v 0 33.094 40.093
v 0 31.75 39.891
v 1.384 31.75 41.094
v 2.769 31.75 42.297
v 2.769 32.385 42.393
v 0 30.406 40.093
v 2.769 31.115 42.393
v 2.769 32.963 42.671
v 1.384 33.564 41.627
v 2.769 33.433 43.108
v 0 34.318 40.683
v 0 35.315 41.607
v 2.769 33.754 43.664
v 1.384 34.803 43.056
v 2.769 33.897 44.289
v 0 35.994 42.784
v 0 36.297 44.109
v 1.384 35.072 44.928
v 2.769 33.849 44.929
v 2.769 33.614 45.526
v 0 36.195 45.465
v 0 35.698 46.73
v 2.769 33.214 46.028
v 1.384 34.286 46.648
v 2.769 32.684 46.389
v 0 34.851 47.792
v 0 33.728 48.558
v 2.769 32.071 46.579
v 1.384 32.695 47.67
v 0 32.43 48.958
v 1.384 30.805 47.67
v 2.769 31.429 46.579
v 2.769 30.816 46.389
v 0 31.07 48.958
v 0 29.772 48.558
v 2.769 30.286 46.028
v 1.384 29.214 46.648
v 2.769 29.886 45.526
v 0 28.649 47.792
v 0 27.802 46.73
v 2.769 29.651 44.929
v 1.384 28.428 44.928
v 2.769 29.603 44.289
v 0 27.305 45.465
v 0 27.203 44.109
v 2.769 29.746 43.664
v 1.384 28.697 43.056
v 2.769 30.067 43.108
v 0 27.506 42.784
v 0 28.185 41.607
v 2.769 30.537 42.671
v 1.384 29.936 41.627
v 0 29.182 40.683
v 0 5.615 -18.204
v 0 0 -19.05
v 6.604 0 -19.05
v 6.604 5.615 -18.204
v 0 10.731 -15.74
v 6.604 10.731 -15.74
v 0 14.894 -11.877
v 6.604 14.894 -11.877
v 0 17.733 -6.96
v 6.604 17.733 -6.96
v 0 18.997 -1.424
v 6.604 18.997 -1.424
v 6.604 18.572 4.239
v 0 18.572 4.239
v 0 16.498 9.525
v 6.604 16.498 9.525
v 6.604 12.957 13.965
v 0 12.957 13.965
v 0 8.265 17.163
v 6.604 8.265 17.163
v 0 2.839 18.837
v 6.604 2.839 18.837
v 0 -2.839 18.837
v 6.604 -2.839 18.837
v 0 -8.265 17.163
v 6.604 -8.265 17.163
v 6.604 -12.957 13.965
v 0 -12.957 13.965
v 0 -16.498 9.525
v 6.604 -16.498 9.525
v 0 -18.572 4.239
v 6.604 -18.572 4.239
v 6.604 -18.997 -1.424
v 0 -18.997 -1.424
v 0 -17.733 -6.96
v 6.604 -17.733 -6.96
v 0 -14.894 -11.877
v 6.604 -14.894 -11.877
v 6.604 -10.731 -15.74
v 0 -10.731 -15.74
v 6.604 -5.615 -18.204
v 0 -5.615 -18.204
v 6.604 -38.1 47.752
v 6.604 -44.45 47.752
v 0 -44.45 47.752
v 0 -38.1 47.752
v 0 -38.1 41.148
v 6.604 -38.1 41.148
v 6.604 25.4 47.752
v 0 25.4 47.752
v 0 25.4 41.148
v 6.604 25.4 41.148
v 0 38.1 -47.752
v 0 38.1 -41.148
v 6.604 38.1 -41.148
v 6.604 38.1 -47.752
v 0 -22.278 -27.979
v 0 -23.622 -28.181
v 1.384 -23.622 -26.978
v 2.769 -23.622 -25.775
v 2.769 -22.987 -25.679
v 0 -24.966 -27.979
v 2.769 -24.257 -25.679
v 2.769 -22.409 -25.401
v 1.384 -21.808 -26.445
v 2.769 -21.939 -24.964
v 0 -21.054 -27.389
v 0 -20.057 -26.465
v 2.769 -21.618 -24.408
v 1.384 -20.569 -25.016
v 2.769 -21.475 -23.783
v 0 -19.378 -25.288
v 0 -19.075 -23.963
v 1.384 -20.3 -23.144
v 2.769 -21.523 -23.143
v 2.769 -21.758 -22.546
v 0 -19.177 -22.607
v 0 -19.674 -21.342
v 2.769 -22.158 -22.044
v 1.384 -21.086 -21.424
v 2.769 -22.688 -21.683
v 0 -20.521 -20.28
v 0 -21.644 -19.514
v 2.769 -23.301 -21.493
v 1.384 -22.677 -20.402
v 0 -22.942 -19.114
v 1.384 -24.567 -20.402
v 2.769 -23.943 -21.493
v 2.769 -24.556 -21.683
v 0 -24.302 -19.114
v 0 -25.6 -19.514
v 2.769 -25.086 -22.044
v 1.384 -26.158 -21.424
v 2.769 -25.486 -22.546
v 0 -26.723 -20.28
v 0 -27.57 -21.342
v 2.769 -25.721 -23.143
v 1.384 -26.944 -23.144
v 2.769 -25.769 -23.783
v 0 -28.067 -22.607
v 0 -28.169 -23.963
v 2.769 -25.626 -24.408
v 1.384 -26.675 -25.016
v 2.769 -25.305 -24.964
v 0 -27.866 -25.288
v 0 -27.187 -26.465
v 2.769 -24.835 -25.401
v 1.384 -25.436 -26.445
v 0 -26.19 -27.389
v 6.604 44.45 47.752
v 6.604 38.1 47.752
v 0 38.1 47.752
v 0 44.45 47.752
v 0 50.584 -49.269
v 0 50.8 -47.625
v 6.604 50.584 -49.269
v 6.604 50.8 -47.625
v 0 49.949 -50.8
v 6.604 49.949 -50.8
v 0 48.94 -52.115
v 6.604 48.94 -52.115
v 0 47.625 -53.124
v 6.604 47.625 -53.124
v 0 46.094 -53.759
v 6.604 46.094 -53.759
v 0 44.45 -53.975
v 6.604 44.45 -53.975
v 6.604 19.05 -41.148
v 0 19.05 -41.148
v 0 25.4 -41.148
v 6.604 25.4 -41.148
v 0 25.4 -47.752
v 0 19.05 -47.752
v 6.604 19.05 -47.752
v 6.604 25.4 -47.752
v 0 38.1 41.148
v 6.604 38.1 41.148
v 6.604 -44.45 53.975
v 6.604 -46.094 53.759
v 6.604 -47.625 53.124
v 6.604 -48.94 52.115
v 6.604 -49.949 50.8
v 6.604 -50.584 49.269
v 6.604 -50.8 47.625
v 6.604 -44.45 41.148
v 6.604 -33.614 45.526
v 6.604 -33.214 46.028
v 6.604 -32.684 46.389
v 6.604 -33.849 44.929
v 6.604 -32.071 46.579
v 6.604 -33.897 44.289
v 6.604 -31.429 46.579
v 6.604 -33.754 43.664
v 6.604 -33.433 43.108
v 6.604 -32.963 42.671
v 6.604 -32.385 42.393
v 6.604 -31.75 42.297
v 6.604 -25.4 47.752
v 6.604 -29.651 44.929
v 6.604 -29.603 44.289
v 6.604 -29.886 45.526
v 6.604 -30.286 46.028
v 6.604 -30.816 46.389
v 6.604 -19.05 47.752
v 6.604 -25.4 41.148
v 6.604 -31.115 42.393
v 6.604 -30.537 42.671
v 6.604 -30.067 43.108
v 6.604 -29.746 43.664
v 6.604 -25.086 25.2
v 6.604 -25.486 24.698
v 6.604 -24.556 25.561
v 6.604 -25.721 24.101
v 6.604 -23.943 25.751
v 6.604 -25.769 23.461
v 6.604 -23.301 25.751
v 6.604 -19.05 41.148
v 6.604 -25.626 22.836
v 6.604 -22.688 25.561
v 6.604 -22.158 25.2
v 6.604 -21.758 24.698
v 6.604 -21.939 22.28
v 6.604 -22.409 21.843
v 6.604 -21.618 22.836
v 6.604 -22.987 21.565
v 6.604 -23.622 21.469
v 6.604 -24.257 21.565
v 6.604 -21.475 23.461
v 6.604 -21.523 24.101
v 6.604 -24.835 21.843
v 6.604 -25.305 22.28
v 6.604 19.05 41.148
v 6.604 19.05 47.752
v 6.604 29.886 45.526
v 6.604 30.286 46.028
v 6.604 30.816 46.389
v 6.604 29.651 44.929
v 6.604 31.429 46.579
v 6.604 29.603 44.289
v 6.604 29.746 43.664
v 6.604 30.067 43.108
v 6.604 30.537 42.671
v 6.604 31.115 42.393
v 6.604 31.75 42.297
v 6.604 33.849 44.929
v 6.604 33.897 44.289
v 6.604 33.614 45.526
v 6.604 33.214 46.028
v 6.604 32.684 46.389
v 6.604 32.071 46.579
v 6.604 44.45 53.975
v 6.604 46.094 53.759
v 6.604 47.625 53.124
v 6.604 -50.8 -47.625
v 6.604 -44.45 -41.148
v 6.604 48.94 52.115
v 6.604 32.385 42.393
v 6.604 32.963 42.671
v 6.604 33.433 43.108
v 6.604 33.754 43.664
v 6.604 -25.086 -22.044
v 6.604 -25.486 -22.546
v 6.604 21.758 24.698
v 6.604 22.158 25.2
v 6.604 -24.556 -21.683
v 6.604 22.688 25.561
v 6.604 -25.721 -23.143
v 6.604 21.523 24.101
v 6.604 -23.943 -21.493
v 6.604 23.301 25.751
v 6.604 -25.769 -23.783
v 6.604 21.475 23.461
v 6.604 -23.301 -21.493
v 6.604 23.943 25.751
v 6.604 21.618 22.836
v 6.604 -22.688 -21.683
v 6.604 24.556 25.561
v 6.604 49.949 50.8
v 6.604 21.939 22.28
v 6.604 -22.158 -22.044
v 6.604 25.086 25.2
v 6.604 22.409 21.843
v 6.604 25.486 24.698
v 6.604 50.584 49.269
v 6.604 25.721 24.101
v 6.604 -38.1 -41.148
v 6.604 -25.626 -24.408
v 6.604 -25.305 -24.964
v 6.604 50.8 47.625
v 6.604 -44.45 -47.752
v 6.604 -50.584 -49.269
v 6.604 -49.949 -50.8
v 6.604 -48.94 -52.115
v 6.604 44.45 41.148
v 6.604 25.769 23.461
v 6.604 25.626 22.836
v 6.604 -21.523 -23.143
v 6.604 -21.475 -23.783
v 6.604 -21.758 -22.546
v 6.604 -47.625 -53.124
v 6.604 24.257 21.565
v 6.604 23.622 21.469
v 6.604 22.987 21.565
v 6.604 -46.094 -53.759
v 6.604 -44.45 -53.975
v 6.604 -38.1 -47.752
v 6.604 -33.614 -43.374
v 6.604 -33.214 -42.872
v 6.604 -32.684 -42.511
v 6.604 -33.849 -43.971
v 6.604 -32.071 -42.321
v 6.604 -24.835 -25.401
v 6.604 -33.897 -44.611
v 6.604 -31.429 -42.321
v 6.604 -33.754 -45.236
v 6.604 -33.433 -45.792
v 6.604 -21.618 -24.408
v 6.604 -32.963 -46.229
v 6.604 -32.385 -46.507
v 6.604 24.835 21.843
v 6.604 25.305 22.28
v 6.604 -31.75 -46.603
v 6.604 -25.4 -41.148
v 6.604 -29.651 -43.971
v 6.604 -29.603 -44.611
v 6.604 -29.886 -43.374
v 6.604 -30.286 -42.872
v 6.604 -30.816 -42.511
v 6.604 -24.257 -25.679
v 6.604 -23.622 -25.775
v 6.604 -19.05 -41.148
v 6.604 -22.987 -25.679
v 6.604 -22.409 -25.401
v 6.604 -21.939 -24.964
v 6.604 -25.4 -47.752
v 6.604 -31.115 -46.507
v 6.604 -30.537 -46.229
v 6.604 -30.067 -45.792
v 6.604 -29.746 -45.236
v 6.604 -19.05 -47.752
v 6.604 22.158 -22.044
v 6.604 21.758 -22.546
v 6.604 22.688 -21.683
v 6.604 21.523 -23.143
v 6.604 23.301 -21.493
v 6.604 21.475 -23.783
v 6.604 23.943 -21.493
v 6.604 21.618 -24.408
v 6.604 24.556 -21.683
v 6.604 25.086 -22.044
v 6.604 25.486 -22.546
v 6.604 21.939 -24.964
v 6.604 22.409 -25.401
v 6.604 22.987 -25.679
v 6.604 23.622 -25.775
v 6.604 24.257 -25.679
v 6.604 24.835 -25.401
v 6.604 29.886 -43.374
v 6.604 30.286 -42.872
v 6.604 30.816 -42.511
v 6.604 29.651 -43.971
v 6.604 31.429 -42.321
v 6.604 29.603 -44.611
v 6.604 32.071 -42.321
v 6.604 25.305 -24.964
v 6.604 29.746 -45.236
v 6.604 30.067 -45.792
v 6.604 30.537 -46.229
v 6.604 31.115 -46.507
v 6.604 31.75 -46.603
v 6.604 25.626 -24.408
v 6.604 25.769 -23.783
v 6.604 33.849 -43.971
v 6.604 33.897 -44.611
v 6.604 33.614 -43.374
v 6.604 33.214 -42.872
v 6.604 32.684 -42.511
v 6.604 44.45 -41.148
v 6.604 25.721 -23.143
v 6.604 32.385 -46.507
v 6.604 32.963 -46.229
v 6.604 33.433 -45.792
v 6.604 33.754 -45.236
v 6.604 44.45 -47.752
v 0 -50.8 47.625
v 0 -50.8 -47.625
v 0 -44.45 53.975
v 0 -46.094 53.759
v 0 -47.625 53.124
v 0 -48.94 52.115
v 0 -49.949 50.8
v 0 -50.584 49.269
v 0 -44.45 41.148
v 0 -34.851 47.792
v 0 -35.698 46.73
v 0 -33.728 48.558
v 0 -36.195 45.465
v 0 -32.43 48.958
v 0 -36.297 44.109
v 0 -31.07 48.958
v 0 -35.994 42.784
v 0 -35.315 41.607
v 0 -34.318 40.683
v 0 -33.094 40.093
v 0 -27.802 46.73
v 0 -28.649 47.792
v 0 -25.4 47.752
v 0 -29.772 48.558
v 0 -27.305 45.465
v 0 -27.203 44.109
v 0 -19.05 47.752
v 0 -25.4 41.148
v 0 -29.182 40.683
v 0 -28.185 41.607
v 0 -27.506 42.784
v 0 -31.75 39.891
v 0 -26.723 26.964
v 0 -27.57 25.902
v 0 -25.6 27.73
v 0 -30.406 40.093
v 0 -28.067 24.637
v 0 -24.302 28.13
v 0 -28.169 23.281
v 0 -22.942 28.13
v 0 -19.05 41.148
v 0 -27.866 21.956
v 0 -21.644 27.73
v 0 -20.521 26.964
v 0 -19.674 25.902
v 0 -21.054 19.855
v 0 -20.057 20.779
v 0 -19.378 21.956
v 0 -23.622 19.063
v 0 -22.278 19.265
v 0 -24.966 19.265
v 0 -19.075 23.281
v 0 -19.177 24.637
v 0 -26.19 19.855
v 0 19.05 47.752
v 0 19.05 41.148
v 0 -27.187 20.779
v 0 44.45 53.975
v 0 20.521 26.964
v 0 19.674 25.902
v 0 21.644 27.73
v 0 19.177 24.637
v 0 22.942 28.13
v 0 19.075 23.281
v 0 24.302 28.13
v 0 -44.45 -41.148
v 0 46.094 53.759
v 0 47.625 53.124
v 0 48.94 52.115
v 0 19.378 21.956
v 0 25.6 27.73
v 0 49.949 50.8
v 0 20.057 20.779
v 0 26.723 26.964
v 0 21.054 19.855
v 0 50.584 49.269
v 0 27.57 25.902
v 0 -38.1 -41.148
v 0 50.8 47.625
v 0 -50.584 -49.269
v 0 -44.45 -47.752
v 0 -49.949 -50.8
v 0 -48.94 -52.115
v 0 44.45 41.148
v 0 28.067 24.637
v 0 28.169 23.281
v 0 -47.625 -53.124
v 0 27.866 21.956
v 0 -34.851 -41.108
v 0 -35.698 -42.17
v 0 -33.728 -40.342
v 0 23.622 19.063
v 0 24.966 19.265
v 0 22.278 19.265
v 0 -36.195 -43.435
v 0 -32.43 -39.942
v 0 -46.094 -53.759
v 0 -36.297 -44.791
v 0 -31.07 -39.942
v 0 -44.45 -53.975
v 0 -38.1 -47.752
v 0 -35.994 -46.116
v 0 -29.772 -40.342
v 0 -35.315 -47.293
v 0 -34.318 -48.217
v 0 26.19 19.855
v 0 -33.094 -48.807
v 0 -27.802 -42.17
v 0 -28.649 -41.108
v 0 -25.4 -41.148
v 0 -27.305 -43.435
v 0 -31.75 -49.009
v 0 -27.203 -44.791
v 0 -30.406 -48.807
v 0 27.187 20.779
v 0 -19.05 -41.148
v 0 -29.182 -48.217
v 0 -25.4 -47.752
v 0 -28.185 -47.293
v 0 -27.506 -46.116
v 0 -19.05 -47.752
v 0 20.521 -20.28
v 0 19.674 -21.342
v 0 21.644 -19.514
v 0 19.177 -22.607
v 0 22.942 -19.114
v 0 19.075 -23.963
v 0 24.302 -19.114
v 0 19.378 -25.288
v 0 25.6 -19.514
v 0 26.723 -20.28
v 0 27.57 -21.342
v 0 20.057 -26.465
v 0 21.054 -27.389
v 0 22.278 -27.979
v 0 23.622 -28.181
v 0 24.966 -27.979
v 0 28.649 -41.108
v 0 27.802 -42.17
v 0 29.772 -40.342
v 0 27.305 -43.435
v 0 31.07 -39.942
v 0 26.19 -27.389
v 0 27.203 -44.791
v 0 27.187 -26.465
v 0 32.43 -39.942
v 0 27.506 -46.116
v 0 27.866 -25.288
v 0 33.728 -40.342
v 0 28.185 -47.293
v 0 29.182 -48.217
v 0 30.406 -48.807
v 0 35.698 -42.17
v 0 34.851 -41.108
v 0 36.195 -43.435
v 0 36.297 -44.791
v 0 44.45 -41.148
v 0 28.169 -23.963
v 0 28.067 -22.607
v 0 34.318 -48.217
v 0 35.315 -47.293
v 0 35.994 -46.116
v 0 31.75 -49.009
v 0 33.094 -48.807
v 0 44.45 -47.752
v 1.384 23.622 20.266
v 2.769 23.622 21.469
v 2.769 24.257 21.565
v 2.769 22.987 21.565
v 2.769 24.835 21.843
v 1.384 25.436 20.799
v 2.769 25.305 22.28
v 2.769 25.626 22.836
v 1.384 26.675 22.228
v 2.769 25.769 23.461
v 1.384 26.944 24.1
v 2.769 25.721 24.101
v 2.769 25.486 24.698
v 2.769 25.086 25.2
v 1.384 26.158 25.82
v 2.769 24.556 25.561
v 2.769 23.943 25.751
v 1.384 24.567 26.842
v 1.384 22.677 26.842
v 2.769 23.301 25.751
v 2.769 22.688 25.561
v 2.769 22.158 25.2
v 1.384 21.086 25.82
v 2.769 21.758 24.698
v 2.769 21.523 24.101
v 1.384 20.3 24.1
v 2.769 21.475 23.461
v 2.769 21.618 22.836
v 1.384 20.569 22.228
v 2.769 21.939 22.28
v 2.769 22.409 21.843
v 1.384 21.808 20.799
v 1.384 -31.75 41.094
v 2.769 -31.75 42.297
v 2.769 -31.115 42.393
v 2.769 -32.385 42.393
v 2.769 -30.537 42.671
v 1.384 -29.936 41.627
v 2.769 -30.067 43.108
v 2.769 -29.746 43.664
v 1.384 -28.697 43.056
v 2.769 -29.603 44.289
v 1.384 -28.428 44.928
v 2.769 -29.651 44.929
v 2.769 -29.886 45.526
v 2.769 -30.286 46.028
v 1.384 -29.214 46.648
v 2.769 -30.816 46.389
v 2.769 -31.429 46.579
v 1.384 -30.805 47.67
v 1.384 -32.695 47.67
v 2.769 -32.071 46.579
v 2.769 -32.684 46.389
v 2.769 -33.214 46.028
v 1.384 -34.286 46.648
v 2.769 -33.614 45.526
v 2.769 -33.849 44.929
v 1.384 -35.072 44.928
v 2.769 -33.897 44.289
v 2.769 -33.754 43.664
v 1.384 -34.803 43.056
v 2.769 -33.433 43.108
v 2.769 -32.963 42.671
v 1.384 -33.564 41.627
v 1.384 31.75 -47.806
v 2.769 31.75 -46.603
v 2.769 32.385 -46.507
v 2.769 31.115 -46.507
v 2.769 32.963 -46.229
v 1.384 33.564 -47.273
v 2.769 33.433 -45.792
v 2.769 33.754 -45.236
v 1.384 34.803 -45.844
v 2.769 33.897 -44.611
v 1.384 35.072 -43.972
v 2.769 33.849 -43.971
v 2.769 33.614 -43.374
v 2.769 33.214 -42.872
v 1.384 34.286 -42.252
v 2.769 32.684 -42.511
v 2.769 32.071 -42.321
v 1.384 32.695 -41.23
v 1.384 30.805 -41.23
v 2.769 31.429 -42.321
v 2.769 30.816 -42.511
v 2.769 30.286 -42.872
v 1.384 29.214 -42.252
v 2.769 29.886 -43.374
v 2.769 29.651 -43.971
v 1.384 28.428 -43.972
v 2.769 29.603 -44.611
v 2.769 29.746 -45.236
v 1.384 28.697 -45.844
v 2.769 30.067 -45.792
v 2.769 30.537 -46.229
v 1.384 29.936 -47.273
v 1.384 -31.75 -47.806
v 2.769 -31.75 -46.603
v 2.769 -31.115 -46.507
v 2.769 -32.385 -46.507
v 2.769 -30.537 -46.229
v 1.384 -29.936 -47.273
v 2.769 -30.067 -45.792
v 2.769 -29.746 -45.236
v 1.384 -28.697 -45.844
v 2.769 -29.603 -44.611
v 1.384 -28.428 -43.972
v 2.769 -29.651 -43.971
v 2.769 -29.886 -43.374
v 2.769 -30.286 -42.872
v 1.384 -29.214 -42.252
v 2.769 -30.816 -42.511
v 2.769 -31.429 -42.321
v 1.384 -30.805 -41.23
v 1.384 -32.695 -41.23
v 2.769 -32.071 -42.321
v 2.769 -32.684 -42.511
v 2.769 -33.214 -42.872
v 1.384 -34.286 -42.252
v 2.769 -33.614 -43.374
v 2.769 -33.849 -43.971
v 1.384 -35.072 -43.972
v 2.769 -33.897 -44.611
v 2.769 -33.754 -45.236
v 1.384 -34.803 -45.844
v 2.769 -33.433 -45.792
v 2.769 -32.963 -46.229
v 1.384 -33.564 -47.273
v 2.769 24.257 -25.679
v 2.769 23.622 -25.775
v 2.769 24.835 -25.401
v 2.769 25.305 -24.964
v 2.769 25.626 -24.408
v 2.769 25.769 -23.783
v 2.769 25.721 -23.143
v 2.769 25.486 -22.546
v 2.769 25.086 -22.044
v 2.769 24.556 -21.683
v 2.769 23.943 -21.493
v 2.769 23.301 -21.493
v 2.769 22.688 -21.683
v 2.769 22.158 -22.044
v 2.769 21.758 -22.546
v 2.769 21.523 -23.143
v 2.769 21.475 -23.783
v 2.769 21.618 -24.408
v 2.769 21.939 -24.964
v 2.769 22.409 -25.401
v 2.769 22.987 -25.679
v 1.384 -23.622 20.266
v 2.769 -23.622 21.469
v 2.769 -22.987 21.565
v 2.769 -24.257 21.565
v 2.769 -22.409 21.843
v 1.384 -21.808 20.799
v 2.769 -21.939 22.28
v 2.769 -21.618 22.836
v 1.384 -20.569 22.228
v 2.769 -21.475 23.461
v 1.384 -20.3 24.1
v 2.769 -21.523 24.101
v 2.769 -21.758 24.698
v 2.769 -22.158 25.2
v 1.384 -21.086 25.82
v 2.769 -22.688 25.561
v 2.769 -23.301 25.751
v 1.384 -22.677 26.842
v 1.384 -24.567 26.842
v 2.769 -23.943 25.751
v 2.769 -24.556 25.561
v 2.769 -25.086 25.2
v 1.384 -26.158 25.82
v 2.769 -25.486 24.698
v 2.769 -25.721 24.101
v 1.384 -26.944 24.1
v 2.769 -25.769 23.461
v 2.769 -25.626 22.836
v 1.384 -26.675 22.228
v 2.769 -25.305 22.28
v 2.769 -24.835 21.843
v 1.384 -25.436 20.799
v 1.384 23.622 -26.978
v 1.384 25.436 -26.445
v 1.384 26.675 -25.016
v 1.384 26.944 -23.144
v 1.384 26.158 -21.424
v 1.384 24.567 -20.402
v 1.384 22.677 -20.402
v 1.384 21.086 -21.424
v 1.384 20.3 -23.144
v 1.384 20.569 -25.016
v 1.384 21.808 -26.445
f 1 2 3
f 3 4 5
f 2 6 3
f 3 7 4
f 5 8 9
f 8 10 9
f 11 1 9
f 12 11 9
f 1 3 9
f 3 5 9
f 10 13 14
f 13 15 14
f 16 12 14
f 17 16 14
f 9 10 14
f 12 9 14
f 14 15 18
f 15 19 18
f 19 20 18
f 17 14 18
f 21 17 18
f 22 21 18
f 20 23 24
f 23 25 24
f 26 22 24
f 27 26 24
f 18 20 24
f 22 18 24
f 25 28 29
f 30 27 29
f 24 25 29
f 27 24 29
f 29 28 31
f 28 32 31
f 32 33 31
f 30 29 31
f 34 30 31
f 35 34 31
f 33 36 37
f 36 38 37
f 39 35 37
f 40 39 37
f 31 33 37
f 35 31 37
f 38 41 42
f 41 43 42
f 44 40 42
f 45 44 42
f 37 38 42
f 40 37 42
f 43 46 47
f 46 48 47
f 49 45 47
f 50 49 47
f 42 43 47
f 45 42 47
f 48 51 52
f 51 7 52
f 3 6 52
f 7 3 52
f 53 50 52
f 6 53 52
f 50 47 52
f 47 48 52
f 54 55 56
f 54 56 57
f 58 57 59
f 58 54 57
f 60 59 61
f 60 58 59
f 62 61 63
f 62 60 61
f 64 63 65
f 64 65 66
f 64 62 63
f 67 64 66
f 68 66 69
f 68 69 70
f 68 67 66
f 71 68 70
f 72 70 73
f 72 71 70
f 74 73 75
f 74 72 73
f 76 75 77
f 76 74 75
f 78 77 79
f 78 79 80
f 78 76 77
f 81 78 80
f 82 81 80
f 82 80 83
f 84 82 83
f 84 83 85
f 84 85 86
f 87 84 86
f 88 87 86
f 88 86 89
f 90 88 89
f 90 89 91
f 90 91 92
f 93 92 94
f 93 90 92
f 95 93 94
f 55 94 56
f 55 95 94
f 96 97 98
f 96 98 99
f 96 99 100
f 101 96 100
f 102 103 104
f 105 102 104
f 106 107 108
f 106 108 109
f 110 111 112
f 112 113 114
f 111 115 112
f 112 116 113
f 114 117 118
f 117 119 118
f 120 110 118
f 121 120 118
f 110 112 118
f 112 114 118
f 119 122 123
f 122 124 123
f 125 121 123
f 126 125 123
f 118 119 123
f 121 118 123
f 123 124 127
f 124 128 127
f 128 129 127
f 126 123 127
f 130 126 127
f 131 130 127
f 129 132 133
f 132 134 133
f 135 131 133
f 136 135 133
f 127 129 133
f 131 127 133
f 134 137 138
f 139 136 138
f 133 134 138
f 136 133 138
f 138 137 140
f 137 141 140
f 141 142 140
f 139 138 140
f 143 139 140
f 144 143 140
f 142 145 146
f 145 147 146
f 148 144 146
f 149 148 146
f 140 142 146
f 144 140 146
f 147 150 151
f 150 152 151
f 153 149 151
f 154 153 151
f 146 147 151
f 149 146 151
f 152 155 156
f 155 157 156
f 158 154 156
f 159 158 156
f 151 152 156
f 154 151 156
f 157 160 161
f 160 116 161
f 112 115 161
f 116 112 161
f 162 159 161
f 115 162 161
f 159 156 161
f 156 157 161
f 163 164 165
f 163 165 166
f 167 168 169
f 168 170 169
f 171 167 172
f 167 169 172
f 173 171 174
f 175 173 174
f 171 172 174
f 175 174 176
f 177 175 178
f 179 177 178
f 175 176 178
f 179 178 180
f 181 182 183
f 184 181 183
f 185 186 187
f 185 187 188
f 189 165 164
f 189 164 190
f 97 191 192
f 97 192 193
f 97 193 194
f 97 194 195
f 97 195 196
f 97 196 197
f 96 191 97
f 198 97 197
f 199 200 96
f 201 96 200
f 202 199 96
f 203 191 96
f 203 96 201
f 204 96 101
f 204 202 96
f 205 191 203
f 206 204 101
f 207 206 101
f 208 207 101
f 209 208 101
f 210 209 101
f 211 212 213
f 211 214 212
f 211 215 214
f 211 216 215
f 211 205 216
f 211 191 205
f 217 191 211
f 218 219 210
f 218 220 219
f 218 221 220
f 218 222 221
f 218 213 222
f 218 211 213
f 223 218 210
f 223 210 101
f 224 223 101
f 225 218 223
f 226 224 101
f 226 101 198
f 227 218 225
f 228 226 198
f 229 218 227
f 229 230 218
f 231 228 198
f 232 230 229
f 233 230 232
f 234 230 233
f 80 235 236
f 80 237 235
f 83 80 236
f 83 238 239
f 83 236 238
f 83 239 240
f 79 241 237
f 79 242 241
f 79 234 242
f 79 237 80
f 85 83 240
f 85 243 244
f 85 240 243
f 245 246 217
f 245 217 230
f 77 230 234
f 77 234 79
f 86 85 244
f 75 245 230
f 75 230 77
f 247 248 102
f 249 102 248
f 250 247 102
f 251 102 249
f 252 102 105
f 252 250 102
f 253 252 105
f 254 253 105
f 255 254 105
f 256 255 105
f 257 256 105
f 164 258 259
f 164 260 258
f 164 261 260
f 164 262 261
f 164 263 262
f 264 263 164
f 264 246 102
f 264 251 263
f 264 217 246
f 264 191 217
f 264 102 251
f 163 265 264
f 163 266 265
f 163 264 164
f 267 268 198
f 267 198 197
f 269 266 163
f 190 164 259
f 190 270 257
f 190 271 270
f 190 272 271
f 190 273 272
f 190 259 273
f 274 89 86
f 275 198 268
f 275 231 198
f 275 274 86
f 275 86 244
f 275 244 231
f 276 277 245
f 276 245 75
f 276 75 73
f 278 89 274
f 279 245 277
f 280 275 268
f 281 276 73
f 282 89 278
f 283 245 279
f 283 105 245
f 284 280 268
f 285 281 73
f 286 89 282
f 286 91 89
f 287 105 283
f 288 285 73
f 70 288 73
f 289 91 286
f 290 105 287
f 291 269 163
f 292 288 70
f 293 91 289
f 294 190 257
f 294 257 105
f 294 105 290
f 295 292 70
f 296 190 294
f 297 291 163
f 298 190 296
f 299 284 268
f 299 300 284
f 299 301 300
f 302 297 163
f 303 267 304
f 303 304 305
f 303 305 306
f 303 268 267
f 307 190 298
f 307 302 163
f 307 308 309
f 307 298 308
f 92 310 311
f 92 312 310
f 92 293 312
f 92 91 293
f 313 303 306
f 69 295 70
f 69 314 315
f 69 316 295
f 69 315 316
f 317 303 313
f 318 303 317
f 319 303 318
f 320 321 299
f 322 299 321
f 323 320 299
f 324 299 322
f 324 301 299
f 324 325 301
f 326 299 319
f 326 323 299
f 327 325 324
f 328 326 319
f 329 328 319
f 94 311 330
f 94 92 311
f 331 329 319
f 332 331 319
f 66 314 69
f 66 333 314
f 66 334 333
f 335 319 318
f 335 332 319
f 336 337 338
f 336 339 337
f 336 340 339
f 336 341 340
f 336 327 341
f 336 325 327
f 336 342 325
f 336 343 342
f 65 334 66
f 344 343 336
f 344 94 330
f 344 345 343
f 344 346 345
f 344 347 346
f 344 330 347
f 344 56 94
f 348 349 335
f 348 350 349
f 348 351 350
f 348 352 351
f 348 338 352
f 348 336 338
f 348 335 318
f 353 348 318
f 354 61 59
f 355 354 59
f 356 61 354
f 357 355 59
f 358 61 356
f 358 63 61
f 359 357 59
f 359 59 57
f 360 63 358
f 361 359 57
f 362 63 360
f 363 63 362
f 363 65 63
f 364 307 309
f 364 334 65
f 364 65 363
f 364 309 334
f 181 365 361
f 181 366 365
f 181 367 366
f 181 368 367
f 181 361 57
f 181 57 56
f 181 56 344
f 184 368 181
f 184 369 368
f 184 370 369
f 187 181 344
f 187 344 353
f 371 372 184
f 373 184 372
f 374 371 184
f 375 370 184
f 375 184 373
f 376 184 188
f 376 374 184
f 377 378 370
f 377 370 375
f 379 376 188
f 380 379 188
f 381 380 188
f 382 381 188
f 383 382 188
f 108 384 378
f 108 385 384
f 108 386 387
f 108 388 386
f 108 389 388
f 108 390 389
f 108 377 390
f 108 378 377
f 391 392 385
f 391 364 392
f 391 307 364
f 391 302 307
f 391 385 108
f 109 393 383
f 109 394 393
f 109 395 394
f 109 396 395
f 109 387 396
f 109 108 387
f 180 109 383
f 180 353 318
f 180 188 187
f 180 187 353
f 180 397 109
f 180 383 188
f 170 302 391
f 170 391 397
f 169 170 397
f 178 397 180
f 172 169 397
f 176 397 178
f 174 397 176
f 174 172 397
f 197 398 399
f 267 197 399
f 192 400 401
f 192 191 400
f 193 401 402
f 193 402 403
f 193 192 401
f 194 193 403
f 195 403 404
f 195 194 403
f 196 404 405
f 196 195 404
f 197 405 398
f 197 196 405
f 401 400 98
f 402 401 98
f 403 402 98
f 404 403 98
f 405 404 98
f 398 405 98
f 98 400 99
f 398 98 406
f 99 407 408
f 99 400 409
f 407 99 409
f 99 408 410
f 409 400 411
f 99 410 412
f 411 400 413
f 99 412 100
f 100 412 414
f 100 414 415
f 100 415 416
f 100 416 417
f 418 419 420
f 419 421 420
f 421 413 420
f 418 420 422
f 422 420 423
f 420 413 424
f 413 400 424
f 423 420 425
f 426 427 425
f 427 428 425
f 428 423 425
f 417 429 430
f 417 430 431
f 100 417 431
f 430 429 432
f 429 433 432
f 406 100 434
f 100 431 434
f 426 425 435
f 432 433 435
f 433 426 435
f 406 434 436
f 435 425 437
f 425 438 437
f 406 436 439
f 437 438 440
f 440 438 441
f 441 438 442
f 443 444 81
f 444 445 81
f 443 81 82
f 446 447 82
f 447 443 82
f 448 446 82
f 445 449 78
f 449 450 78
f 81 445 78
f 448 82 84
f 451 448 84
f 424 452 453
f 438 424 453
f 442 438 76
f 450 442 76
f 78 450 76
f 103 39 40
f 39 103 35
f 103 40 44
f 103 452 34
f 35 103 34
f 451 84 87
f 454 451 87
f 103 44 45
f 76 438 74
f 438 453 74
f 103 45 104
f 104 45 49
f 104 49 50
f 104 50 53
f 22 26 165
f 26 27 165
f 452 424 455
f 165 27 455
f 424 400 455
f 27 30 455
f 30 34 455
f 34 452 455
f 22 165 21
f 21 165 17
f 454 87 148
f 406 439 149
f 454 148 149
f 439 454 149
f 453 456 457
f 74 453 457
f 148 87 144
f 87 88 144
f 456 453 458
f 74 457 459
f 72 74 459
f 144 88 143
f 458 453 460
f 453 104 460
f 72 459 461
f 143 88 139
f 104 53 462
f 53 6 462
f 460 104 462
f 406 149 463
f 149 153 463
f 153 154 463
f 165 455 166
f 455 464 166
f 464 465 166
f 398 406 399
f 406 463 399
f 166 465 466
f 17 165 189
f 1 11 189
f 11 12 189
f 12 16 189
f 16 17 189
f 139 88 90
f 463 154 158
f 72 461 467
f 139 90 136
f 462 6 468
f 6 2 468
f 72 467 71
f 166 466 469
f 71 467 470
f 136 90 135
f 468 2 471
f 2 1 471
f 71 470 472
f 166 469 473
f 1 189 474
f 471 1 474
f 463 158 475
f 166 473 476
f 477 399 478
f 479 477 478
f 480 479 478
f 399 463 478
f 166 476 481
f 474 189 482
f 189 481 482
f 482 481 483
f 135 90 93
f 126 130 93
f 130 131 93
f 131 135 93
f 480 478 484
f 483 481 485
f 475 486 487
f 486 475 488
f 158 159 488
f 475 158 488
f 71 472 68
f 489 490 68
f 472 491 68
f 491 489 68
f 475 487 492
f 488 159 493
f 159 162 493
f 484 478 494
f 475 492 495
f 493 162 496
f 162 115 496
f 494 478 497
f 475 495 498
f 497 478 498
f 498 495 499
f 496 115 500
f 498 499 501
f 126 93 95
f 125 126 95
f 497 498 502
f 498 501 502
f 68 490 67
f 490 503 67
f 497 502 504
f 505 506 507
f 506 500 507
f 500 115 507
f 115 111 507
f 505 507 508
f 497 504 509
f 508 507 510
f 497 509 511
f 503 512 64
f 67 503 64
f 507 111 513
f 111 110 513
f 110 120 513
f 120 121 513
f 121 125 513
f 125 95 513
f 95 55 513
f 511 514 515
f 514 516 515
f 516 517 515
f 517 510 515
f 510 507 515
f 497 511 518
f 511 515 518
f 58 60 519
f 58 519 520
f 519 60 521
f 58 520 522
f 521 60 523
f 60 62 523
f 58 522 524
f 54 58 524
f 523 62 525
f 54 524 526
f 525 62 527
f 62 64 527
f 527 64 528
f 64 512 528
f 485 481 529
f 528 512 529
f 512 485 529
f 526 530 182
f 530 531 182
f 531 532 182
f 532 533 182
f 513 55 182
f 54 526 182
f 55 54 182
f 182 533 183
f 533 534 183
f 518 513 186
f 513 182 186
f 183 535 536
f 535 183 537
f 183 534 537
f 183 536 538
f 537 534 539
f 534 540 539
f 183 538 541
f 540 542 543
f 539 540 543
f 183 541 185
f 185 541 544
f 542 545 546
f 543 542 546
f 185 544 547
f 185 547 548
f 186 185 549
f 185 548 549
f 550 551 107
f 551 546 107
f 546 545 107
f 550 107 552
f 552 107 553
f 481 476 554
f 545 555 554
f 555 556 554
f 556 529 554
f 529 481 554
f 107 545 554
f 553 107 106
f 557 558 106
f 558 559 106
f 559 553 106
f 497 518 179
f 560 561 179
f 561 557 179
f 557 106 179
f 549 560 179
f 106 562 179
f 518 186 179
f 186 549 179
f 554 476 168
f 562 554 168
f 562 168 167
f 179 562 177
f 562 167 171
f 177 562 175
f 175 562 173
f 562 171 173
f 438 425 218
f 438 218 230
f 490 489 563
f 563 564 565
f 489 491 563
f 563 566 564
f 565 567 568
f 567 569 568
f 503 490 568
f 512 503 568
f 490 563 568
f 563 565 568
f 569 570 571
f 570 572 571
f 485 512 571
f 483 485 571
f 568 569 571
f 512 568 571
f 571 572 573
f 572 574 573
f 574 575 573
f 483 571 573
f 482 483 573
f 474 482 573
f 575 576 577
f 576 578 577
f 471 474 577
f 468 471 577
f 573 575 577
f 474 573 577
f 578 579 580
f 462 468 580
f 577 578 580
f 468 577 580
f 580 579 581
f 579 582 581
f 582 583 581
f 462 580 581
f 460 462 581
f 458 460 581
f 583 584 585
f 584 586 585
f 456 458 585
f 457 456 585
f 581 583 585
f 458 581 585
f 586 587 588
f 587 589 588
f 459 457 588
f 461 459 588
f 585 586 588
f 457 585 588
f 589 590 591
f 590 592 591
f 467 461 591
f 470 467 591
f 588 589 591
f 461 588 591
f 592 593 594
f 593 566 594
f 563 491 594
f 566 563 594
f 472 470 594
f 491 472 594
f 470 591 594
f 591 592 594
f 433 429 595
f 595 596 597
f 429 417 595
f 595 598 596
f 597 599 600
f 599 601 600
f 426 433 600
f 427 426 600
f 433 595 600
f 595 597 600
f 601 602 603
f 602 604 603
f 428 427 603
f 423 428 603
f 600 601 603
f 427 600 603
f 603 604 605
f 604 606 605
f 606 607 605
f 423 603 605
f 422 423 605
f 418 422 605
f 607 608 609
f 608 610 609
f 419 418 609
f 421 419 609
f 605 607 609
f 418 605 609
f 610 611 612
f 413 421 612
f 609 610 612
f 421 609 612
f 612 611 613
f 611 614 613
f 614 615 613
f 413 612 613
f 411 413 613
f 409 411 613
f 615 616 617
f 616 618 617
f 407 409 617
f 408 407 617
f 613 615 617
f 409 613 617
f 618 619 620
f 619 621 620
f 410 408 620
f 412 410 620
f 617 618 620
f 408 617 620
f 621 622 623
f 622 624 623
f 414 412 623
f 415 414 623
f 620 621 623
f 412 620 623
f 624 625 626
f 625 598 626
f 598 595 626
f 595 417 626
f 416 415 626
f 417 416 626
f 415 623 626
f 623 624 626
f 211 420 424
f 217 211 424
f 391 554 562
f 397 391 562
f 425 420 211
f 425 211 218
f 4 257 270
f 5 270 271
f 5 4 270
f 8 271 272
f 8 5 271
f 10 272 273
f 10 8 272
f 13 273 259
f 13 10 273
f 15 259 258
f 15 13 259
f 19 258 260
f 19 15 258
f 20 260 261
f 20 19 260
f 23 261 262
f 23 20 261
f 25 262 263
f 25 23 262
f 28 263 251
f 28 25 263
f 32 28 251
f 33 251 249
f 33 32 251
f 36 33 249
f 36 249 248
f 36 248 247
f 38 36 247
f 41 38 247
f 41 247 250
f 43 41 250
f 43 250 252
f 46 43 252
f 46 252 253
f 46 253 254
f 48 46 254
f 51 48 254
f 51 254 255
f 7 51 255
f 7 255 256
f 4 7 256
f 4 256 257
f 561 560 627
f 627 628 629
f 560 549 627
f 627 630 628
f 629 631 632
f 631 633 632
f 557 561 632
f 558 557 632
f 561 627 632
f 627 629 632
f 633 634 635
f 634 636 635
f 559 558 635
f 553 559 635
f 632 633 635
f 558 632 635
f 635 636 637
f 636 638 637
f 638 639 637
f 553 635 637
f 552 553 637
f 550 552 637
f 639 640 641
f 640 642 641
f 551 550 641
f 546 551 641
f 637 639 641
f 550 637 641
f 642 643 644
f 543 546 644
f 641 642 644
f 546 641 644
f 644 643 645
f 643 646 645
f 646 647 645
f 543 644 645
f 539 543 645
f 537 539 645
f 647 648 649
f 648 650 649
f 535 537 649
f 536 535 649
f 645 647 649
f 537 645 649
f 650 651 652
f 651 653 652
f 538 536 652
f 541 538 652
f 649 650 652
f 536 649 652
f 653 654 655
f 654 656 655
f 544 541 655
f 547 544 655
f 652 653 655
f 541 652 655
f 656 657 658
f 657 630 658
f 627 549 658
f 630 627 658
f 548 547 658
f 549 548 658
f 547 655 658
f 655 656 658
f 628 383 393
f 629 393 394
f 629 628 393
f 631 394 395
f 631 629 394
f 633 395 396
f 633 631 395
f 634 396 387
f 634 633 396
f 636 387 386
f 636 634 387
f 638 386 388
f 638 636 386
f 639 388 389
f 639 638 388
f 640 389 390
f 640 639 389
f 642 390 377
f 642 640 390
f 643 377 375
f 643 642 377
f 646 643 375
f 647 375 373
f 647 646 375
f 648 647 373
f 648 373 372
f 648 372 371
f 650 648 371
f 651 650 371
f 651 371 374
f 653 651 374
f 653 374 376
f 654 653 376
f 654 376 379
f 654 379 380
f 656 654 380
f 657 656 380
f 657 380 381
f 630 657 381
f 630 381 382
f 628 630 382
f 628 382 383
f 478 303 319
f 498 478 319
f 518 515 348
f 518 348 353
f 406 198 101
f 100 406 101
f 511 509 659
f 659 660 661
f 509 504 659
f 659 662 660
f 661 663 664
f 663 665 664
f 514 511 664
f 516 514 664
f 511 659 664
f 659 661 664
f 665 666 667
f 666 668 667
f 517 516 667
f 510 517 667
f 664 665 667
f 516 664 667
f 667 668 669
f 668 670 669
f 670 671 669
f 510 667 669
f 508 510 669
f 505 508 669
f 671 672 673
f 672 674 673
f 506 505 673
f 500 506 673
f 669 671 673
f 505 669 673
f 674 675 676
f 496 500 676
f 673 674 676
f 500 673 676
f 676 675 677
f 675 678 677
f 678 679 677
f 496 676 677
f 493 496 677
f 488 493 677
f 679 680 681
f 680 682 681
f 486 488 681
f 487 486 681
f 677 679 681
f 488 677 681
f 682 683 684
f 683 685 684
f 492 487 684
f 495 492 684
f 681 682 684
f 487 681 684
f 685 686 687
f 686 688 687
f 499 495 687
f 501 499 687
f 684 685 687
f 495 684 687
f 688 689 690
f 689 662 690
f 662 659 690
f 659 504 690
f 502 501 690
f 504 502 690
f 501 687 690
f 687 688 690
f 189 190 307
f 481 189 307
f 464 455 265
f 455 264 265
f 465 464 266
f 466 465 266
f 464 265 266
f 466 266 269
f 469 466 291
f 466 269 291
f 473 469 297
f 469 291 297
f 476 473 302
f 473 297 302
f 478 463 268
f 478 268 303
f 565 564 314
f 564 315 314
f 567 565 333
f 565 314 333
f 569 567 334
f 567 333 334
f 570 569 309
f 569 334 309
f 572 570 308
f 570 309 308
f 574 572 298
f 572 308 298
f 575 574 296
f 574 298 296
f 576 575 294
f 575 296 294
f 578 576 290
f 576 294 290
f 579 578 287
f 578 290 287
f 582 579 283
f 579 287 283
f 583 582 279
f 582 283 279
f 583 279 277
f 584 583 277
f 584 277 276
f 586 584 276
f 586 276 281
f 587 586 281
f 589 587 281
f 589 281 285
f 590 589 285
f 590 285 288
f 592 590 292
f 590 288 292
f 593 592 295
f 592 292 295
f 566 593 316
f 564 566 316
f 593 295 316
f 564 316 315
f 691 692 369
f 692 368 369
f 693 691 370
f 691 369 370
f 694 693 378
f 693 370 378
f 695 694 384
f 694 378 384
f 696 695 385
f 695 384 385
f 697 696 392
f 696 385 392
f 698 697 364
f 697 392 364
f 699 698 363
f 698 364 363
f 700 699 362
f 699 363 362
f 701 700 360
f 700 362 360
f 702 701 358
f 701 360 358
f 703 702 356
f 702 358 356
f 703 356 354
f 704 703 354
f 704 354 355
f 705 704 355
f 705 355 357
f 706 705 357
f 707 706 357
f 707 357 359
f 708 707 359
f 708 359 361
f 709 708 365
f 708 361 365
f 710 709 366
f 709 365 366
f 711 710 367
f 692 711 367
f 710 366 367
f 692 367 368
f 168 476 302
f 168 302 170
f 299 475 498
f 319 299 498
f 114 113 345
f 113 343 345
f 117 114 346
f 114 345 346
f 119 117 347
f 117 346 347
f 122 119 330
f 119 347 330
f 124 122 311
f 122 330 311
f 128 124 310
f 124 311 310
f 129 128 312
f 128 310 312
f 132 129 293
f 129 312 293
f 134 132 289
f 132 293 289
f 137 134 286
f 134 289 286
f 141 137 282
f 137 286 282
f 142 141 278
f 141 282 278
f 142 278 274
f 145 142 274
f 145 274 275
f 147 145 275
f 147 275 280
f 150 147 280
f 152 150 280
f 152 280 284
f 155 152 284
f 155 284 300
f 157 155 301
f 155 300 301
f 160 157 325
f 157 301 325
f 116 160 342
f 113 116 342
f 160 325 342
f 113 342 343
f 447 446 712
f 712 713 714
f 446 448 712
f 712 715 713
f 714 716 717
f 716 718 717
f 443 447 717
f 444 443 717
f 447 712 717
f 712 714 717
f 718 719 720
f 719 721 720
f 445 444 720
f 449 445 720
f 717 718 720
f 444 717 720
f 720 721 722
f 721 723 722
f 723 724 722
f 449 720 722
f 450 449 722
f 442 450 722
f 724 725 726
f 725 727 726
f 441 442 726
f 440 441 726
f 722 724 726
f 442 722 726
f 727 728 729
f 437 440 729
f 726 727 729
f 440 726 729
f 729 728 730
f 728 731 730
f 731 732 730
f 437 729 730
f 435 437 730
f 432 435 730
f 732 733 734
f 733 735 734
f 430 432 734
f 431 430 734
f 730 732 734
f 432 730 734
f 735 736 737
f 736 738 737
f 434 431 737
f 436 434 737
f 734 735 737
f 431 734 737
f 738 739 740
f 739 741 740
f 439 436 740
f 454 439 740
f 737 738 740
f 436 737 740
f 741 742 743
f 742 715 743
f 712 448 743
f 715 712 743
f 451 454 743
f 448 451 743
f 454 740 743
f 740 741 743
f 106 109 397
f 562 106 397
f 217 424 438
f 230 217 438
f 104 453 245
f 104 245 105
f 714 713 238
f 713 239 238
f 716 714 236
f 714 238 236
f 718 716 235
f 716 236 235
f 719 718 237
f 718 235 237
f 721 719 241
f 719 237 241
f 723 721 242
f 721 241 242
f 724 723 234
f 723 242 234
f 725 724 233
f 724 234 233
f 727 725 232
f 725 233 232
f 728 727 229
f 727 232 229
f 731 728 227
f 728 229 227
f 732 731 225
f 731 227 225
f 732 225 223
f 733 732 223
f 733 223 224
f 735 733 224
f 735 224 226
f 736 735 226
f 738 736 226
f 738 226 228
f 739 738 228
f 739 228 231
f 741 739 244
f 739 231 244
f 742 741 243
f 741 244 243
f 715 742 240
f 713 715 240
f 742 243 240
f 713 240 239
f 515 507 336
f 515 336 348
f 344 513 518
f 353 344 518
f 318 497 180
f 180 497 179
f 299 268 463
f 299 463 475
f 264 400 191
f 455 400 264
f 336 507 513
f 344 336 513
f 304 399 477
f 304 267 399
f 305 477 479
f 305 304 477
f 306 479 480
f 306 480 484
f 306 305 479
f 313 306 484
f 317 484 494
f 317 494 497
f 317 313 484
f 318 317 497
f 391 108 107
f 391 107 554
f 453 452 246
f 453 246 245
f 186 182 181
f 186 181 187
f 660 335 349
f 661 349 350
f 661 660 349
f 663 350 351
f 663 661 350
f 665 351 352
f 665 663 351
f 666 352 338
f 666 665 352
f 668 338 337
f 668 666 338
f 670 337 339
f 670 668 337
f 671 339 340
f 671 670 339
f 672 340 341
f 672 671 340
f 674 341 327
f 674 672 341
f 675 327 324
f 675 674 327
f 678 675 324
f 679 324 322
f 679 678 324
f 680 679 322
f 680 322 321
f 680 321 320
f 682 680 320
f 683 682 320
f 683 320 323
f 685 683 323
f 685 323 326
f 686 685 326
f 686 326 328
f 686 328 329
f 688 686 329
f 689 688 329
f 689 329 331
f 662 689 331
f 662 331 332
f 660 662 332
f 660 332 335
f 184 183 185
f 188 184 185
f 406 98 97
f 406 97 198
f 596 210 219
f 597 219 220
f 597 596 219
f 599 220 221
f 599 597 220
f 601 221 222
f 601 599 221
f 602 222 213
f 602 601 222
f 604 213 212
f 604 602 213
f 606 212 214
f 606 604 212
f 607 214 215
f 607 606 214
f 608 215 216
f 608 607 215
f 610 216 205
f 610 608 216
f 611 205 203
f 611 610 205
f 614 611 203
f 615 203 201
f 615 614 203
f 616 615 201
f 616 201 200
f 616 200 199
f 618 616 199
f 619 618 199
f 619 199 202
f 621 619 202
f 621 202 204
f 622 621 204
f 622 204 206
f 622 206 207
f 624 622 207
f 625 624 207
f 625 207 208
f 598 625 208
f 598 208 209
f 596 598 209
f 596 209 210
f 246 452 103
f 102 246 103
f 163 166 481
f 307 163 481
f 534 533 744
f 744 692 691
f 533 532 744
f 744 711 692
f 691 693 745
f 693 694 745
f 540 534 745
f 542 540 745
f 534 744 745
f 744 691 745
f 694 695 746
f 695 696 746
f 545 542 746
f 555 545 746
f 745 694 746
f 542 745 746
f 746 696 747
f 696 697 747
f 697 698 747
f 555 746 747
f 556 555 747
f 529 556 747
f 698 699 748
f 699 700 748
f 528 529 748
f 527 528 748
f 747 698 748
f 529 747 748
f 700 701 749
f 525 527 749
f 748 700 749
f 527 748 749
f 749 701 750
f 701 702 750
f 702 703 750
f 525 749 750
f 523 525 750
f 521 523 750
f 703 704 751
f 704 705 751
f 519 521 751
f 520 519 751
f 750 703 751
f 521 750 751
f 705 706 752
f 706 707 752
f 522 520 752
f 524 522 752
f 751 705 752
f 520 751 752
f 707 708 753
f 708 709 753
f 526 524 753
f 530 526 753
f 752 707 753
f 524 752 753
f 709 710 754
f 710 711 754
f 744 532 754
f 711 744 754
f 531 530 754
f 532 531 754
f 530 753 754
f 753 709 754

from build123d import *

# Parameters (mm, degrees)
SKETCH1_W                                         = 107.95
SKETCH1_H                                         = 101.6
SKETCH1_R                                         = 19.05
SKETCH1_R_2                                       = 2.15265
SKETCH1_W_2                                       = 6.604
SKETCH1_H_2                                       = 6.35
BOSS_EXTRUDE1_DEPTH                               = 6.604
F_10_32_TAPPED_HOLE1_D                            = 4.0386
F_10_32_TAPPED_HOLE1_DEPTH                        = 12.0396
F_10_32_TAPPED_HOLE1_TIP                          = 1.213317848
FILLET1_R                                         = 6.35
CSK_FOR_8_FLAT_HEAD_SOCKET_CAP_SCREW2_D           = 4.3053
CSK_FOR_8_FLAT_HEAD_SOCKET_CAP_SCREW2_CSINK_D     = 9.1186
CSK_FOR_8_FLAT_HEAD_SOCKET_CAP_SCREW2_CSINK_ANGLE = 82


with BuildPart() as part:
    # Sketch1 → Boss-Extrude1 (new body)
    with BuildSketch(Plane(origin=(0, 0, 0), x_dir=(0, 0, -1), z_dir=(1, 0, 0))):
        Rectangle(SKETCH1_W, SKETCH1_H)
        Circle(SKETCH1_R, mode=Mode.SUBTRACT)
        with Locations((-44.45, 31.75)):
            Circle(SKETCH1_R_2, mode=Mode.SUBTRACT)
        with Locations((-44.45, -31.75)):
            Circle(SKETCH1_R_2, mode=Mode.SUBTRACT)
        with Locations((44.45, 31.75)):
            Circle(SKETCH1_R_2, mode=Mode.SUBTRACT)
        with Locations((44.45, -31.75)):
            Circle(SKETCH1_R_2, mode=Mode.SUBTRACT)
        with Locations((-44.45, 41.275)):
            Rectangle(SKETCH1_W_2, SKETCH1_H_2, mode=Mode.SUBTRACT)
        with Locations((-44.45, 22.225)):
            Rectangle(SKETCH1_W_2, SKETCH1_H_2, mode=Mode.SUBTRACT)
        with Locations((-44.45, -22.225)):
            Rectangle(SKETCH1_W_2, SKETCH1_H_2, mode=Mode.SUBTRACT)
        with Locations((-44.45, -41.275)):
            Rectangle(SKETCH1_W_2, SKETCH1_H_2, mode=Mode.SUBTRACT)
        with Locations((44.45, 41.275)):
            Rectangle(SKETCH1_W_2, SKETCH1_H_2, mode=Mode.SUBTRACT)
        with Locations((44.45, 22.225)):
            Rectangle(SKETCH1_W_2, SKETCH1_H_2, mode=Mode.SUBTRACT)
        with Locations((44.45, -41.275)):
            Rectangle(SKETCH1_W_2, SKETCH1_H_2, mode=Mode.SUBTRACT)
        with Locations((44.45, -22.225)):
            Rectangle(SKETCH1_W_2, SKETCH1_H_2, mode=Mode.SUBTRACT)
    extrude(amount=BOSS_EXTRUDE1_DEPTH)

    # #10-32 Tapped Hole1
    with Locations(Plane(origin=(6.604, 0, 0), x_dir=(0, 0, -1), z_dir=(1, 0, 0))):
        with Locations((-23.622, 23.622), (23.622, 23.622), (-23.622, -23.622), (23.622, -23.622)):
            Hole(F_10_32_TAPPED_HOLE1_D / 2, depth=F_10_32_TAPPED_HOLE1_DEPTH)
            with Locations((0, 0, -(F_10_32_TAPPED_HOLE1_DEPTH + F_10_32_TAPPED_HOLE1_TIP / 2))):  # 118° drill point
                Cone(0, F_10_32_TAPPED_HOLE1_D / 2, F_10_32_TAPPED_HOLE1_TIP, mode=Mode.SUBTRACT)

    # Fillet1
    fillet1_edges = [part.edges().sort_by_distance(p)[0] for p in [
        (3.302, -50.8, -53.975),
        (3.302, -50.8, 53.975),
        (3.302, 50.8, 53.975),
        (3.302, 50.8, -53.975),
    ]]
    fillet(fillet1_edges, radius=FILLET1_R)

    # CSK for #8 Flat Head Socket Cap Screw2 (through all)
    with Locations(Plane.ZY):
        with Locations((-44.45, 31.75), (-23.622, 23.622), (23.622, 23.622), (44.45, 31.75), (23.622, -23.622), (-23.622, -23.622), (-44.45, -31.75), (44.45, -31.75)):
            CounterSinkHole(CSK_FOR_8_FLAT_HEAD_SOCKET_CAP_SCREW2_D / 2, CSK_FOR_8_FLAT_HEAD_SOCKET_CAP_SCREW2_CSINK_D / 2, counter_sink_angle=CSK_FOR_8_FLAT_HEAD_SOCKET_CAP_SCREW2_CSINK_ANGLE)


solid = part.part
